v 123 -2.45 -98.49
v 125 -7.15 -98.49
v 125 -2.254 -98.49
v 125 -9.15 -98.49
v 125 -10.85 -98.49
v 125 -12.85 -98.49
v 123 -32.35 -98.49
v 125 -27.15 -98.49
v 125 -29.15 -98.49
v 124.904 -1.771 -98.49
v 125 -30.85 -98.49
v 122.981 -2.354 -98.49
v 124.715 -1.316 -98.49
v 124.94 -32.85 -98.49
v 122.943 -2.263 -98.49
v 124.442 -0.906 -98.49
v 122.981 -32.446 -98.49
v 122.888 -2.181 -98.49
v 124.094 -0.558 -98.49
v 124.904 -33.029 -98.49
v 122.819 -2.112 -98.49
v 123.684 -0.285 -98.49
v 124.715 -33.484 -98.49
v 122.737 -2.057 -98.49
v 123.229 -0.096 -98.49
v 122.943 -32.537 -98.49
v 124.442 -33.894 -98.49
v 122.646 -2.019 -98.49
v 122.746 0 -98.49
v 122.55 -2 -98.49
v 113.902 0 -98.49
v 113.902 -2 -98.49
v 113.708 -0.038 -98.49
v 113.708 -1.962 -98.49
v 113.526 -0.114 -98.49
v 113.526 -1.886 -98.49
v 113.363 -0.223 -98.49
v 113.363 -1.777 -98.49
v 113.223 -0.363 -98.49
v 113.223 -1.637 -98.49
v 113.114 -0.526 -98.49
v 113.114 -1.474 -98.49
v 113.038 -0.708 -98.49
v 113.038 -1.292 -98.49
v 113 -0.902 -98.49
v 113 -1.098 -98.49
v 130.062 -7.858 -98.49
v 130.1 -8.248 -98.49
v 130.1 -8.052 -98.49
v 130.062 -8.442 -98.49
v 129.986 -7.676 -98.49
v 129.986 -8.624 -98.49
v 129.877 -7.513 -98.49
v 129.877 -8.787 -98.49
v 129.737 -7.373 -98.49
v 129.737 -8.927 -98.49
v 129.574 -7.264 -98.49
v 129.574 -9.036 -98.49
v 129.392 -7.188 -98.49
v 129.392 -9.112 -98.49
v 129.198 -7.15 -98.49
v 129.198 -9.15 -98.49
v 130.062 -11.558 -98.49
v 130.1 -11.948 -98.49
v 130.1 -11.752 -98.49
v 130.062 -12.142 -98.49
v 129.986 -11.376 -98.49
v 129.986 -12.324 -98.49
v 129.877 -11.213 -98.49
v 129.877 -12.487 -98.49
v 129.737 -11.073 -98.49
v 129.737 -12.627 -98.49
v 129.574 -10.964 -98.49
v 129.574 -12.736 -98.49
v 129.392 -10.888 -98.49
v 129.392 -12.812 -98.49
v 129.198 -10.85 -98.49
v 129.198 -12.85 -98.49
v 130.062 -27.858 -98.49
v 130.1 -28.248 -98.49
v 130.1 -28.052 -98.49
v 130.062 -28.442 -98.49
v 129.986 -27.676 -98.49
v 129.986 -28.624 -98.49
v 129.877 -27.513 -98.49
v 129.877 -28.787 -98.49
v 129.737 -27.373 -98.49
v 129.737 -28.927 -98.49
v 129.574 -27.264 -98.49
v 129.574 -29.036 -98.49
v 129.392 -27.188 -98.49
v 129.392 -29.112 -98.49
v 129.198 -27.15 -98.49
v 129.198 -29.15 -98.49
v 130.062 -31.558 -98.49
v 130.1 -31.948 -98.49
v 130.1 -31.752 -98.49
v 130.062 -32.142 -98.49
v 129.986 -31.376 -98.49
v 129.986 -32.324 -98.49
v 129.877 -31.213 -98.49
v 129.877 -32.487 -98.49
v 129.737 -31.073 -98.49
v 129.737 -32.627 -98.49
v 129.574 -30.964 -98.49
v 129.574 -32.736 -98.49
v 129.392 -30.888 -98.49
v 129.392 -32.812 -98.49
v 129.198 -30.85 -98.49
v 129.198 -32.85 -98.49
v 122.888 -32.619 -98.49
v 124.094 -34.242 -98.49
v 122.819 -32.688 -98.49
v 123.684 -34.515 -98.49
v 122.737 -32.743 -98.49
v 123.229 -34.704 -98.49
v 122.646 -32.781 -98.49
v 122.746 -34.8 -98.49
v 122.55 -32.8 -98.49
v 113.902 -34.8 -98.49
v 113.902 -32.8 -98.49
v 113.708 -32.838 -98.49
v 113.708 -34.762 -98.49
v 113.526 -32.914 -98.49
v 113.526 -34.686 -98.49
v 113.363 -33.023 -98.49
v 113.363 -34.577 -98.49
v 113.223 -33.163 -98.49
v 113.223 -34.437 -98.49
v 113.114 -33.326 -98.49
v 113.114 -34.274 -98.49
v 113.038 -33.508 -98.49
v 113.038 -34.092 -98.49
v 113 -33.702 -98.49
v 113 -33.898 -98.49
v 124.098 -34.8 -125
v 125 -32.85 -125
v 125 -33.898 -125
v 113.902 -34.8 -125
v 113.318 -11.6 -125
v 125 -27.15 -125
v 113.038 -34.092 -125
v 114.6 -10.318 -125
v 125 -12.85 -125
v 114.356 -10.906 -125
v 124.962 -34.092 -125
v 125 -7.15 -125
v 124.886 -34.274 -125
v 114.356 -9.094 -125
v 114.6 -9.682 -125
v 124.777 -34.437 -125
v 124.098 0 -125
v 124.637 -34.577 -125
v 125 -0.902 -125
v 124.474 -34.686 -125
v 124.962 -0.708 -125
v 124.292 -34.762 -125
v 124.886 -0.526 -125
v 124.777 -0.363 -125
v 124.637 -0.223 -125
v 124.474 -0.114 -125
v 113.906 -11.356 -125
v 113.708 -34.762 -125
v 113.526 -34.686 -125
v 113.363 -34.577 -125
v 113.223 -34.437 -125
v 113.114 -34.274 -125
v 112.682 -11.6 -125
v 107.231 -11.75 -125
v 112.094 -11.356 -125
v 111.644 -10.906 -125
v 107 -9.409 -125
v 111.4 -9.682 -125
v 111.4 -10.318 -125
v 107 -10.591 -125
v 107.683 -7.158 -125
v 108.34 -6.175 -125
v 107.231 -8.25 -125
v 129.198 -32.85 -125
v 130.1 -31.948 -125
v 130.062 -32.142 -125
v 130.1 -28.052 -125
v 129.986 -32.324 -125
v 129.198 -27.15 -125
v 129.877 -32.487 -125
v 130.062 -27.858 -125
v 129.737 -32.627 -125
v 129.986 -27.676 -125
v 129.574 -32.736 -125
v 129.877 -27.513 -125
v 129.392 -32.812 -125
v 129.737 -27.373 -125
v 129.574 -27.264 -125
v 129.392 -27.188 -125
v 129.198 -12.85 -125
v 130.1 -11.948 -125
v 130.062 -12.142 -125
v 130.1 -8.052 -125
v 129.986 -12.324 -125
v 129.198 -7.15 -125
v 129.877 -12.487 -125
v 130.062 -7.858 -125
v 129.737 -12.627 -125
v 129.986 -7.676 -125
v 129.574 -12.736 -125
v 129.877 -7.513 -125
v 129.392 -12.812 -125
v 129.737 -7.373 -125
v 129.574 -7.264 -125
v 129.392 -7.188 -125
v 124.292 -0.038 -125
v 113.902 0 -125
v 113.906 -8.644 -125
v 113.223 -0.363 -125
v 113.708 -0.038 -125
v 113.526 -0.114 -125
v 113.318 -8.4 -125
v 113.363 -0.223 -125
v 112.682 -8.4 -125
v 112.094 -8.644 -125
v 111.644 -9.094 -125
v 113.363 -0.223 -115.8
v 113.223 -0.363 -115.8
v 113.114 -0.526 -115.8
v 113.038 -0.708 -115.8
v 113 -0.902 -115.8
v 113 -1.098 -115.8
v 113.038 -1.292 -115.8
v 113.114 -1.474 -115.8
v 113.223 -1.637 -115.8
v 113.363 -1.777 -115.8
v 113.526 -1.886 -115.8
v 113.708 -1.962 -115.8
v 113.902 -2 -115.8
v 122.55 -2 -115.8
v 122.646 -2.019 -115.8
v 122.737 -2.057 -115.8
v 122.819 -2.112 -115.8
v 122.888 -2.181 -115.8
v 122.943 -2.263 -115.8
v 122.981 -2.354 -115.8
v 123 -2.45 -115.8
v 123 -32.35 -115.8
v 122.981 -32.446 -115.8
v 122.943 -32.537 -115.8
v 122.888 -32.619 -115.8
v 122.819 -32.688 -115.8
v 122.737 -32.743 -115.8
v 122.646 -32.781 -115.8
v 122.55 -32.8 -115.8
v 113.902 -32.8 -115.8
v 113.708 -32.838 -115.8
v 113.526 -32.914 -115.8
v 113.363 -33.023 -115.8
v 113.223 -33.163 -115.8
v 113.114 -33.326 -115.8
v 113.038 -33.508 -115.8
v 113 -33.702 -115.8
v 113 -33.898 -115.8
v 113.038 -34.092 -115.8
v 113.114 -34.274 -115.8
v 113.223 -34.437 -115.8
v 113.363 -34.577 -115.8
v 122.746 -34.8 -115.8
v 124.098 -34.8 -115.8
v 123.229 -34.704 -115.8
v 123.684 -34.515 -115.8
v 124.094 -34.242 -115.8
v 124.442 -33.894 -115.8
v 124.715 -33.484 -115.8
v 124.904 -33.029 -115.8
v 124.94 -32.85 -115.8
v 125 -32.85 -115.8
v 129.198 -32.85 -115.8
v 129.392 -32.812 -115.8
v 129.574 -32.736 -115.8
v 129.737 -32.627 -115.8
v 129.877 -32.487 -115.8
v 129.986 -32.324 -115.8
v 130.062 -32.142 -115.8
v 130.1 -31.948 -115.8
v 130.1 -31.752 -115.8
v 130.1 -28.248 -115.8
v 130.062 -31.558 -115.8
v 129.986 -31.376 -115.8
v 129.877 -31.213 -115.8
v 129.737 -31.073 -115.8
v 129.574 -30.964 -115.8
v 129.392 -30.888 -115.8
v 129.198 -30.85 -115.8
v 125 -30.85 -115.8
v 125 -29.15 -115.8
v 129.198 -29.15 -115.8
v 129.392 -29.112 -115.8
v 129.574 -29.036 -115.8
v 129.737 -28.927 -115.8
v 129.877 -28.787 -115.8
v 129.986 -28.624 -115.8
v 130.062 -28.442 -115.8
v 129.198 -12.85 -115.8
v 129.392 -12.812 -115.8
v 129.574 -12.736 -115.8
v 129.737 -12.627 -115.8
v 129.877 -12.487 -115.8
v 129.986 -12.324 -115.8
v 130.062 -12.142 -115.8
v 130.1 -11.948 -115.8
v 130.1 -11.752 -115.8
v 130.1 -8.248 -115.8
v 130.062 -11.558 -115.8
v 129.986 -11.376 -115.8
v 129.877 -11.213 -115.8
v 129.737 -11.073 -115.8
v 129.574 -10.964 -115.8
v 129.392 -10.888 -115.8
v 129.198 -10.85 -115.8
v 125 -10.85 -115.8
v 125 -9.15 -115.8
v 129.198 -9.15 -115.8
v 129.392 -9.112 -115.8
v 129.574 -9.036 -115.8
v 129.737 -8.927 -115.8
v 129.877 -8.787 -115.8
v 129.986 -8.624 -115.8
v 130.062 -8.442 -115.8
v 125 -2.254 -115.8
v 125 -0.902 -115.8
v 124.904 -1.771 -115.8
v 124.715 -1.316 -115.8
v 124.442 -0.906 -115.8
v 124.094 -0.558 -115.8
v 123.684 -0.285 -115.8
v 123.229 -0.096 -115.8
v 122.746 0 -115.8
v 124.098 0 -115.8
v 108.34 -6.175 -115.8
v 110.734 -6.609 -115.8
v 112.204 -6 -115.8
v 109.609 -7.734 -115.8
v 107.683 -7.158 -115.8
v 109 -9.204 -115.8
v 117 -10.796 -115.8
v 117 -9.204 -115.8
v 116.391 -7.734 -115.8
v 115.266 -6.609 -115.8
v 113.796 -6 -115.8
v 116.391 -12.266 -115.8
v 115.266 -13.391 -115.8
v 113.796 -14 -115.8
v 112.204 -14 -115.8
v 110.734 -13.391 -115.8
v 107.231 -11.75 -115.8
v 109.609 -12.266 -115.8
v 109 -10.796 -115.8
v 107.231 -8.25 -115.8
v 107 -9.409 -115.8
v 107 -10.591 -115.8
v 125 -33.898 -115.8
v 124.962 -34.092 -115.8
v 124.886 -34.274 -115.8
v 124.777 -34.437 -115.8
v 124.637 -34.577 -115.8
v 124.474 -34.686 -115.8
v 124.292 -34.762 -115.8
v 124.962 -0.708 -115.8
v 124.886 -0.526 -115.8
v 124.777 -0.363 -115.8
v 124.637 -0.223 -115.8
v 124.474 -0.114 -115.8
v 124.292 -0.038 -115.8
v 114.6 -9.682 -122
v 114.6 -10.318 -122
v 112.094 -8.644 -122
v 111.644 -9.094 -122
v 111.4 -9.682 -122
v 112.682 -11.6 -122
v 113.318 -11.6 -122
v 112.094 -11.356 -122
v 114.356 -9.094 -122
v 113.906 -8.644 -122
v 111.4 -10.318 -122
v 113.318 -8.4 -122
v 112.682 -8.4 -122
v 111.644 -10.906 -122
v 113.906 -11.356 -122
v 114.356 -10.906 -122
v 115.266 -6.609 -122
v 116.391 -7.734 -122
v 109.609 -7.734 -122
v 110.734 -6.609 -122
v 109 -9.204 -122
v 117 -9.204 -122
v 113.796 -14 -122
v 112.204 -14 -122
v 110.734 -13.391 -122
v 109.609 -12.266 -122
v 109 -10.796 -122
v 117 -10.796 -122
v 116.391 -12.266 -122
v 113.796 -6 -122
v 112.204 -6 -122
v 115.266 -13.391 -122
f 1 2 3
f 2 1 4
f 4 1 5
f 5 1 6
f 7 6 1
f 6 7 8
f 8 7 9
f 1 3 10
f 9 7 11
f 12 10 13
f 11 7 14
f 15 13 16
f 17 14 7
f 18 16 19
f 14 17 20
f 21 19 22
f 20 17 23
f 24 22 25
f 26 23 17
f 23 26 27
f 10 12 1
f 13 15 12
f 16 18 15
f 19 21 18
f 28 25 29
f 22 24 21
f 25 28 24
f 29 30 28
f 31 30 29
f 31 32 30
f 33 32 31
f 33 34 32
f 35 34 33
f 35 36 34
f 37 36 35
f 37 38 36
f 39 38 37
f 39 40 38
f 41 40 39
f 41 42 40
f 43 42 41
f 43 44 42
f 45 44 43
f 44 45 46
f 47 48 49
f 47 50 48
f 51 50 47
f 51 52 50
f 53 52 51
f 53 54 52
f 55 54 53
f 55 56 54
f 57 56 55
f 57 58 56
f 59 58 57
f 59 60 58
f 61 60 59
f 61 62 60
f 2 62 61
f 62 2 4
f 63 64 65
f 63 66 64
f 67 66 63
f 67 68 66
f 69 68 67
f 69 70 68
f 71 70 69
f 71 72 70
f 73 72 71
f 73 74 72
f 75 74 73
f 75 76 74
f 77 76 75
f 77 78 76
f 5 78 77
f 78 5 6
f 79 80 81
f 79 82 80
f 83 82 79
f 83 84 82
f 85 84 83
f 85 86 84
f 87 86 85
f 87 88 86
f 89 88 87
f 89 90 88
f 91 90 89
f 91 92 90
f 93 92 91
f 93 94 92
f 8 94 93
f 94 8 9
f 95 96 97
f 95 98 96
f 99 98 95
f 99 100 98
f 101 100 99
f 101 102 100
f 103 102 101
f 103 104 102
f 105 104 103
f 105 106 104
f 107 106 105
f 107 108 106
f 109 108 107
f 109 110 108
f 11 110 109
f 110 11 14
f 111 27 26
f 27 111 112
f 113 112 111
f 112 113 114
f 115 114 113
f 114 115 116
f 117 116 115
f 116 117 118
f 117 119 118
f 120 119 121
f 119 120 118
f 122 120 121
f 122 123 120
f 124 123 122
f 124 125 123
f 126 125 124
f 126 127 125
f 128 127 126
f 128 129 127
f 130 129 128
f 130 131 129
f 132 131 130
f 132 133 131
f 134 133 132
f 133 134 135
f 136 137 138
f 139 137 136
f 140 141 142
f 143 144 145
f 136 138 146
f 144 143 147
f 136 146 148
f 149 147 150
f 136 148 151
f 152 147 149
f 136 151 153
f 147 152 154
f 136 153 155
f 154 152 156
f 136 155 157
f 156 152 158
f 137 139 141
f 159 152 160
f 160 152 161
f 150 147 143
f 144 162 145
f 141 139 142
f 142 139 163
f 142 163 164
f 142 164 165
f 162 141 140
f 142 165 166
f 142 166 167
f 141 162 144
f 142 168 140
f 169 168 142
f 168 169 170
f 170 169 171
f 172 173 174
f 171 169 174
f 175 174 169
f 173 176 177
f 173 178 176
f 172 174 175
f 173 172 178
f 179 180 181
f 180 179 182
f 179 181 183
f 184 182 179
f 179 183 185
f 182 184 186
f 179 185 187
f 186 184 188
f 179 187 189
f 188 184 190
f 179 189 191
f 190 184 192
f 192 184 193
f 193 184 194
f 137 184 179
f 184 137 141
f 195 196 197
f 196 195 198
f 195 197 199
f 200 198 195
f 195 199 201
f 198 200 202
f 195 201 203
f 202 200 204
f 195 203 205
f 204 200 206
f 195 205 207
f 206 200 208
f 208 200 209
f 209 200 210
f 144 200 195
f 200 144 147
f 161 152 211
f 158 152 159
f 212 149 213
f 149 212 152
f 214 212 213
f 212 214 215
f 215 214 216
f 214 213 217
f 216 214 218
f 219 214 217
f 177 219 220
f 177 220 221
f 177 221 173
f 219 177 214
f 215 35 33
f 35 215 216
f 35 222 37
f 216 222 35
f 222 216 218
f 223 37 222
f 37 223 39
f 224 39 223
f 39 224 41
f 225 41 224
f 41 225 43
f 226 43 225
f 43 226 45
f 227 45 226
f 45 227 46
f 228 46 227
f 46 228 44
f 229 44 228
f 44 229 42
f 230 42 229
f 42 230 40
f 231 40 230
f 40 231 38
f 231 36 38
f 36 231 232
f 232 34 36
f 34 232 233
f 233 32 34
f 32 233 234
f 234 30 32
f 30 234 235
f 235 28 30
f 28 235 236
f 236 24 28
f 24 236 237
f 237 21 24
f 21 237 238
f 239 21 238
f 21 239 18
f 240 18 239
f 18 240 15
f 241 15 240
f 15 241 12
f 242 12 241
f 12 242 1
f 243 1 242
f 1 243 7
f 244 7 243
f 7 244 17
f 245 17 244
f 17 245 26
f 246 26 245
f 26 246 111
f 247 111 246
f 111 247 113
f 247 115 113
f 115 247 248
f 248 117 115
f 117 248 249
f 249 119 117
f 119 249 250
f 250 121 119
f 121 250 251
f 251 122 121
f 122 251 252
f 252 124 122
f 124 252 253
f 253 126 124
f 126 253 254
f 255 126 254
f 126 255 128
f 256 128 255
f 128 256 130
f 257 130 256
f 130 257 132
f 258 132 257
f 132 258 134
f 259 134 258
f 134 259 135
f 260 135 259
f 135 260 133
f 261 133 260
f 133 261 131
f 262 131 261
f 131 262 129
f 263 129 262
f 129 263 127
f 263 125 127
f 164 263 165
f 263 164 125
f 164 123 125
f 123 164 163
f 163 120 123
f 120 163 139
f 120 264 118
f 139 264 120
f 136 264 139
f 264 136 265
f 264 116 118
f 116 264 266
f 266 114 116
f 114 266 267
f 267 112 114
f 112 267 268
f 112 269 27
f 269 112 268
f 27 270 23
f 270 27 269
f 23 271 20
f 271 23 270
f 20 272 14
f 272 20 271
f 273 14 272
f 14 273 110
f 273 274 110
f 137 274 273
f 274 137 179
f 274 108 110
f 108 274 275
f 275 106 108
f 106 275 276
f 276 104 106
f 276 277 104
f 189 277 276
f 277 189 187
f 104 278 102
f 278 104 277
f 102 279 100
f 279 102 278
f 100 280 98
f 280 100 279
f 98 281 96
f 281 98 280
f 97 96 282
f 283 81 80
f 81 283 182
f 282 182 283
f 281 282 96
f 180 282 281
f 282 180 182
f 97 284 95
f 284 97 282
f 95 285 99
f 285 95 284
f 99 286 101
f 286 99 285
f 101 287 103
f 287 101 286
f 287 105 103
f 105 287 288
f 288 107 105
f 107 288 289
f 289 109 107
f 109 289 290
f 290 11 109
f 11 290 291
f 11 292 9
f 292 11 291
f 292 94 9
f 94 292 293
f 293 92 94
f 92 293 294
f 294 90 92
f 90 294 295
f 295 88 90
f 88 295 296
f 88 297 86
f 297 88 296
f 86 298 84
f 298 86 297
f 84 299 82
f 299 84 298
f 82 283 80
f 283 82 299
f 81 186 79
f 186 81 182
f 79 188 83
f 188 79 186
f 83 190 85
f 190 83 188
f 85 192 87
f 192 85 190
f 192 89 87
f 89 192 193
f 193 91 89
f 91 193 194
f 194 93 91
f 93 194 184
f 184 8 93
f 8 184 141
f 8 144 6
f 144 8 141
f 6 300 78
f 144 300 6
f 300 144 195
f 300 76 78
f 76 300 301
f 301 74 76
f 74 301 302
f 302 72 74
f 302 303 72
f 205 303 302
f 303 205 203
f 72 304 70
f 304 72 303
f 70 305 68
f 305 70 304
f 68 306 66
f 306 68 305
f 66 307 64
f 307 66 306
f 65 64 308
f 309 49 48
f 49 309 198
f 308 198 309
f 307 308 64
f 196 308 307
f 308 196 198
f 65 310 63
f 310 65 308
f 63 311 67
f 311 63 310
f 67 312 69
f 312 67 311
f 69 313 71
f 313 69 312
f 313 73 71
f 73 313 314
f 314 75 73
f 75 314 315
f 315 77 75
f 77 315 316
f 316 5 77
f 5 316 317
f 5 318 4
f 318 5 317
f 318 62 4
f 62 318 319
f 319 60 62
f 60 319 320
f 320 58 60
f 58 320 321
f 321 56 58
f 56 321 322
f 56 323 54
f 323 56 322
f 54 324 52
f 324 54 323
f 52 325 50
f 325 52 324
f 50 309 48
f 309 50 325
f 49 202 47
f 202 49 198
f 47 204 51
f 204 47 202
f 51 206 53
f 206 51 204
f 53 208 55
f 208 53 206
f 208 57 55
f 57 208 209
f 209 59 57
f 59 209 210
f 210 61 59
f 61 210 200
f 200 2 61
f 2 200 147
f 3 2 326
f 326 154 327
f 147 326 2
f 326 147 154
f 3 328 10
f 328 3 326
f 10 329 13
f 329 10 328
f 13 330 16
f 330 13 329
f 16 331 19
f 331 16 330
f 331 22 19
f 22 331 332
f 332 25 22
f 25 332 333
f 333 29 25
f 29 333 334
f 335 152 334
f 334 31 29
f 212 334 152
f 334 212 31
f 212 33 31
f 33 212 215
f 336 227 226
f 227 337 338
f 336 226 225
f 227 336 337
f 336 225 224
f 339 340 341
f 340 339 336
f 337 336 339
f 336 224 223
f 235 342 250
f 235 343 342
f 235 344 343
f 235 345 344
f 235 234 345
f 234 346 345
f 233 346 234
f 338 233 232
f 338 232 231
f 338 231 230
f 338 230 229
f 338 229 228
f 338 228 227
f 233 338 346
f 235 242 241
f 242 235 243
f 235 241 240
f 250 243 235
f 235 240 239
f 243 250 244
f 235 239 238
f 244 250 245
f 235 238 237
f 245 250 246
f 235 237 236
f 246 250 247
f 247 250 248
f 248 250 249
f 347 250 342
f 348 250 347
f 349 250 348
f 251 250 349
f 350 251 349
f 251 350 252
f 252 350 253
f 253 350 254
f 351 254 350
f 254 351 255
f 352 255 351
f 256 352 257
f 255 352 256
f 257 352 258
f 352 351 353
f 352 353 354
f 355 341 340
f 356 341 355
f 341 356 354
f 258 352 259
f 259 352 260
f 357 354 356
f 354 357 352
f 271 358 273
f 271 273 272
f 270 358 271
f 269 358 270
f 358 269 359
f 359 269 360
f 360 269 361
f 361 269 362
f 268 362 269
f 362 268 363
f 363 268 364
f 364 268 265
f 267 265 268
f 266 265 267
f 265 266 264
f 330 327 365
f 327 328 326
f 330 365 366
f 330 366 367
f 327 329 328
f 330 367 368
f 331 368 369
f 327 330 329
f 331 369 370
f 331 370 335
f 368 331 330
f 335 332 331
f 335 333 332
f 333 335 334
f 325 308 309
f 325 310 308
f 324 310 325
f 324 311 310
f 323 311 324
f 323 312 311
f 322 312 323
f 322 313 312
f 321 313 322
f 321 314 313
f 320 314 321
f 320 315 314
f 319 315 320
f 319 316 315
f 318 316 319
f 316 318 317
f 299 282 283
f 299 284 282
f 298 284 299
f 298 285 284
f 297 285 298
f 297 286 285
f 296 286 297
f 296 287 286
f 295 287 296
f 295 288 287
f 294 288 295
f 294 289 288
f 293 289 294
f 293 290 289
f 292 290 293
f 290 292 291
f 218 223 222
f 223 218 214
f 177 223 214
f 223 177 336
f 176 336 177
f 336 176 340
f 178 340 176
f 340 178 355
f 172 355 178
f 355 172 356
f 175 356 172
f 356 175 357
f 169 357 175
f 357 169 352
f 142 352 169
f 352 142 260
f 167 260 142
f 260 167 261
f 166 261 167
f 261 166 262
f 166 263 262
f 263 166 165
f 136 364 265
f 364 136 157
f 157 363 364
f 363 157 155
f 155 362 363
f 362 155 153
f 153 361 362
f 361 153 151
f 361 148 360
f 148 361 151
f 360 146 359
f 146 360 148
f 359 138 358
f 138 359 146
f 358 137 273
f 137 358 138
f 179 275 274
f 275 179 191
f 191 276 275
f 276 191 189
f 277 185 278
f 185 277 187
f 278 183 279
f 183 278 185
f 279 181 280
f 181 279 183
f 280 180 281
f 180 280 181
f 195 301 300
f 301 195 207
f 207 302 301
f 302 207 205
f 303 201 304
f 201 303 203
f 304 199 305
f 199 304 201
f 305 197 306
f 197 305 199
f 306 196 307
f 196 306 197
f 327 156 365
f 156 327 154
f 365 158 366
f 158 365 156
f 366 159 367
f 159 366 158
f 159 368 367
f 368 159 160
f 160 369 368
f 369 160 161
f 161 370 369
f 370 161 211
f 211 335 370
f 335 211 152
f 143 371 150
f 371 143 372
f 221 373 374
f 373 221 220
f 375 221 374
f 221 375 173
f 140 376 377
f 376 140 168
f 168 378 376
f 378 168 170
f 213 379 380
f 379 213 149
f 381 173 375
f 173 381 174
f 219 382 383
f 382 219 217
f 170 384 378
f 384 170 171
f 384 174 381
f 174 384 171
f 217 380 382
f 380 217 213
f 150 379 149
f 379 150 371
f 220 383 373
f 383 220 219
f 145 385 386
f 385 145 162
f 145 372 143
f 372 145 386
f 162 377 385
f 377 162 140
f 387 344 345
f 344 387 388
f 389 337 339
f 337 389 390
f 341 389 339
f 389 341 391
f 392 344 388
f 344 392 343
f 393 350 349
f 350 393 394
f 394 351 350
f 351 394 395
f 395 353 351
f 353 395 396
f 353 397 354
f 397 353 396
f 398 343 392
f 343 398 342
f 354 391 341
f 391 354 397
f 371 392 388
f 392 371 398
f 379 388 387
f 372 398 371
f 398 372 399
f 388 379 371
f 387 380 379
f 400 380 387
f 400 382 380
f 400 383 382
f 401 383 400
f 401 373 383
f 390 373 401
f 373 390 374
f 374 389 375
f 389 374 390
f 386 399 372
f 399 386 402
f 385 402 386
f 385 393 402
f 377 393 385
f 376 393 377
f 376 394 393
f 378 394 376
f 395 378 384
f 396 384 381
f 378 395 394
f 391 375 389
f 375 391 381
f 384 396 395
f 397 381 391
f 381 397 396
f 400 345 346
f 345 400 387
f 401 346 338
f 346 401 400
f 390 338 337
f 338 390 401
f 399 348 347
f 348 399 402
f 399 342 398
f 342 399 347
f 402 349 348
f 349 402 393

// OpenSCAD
// file: ../frame-mockup.scad
include <lumpyscad/lib.scad>;

tolerance = 0.2;

y_rail_side_rail_dist_x = 135;
y_rail_side_rail_dist_z = 33;
y_rail_length = 330;
y_rail_length_front = 190;
side_rail_length = 290;
side_rail_length_front = 125;
side_rail_length_rear = side_rail_length-40-side_rail_length_front;
side_connector_length = 250;
x_rail_length = side_connector_length+40;

x_rail_pos_z = 200;

vertical_side_rail_length = 400;

psu_length = 215+tolerance*2;
psu_width = 115+tolerance*2;
psu_height = 30+tolerance*2;

psu_terminal_area_depth = 15;
psu_metal_thickness = 2;

module position_x_axis() {
  translate([0,front*20/2,x_rail_pos_z]) {
    children();
  }
}

// meanwell LRS-350-24
module psu() {
  psu_fan_from_end = 48; // not very accurate, only for visualization
  psu_fan_from_side = 38; // not very accurate, only for visualization
  psu_fan_diam = 52; // not very accurate, only for visualization

  module body() {
    cube([psu_width,psu_length,psu_height],center=true);
  }

  module holes() {
    for(x=[left,right],y=[32.5,150]) {
      translate([0,-psu_length/2+y,-psu_height/2]) {
        // side holes
        translate([x*psu_width/2,0,12.5]) {
          rotate([0,90,0]) {
            hole(4,10,resolution);
          }
        }
        translate([x*(50/2),0,0]) {
          hole(4,10,resolution);
        }
      }
    }

    translate([left*(psu_width/2-psu_fan_from_side),psu_length/2-psu_fan_from_end,psu_height/2]) {
      hole(psu_fan_diam,0.5,resolution);
    }

    translate([0,front*(psu_length/2),psu_height/2]) {
      height = psu_height-psu_metal_thickness;
      width = psu_width-psu_metal_thickness*2;

      cube([width,psu_terminal_area_depth*2,height*2],center=true);
    }
  }

  difference() {
    color("#bbb") body();
    color("#777") holes();
  }
}

module fake_ender3_frame(frame_color="#555", opacity=1) {
  module body() {
    // side braces/feet
    for(x=[left,right]) {
      translate([x*(side_connector_length/2+40/2),side_rail_length/2-side_rail_length_front,40/2]) {
        rotate([90,0,0]) {
          rotate([0,0,90]) {
            color(frame_color, opacity) extrusion_4040(side_rail_length);
          }
        }
      }
    }

    // vertical
    for(x=[left,right]) {
      translate([x*(side_connector_length/2+40/2),40/2,40]) {
        translate([0,0,vertical_side_rail_length/2]) {
          color(frame_color, opacity) extrusion_2040(vertical_side_rail_length);
        }
        nema_type = NEMA17_34;
        translate([0,20/2+NEMA_width(nema_type)/2,NEMA_length(nema_type)]) {
          rotate([0,0,90*x]) {
            NEMA(nema_type);
          }
        }
      }
    }

    // top rail
    translate([0,40/2,40+vertical_side_rail_length+20/2]) {
      rotate([0,90,0]) {
        color(frame_color, opacity) extrusion_2020(side_connector_length+40*2);
      }
    }

    position_x_axis() {
      // x rail
      rotate([0,90,0]) {
        color(frame_color, opacity) extrusion_2020(y_rail_length);
      }
    }

    // left/right connector
    color(frame_color, opacity) difference() {
      translate([0,40/2,40/2]) {
        rotate([0,90,0]) {
          extrusion_4040(side_connector_length);
        }
      }
      translate([0,20,40/2+y_rail_side_rail_dist_z]) {
        cube([20,50,40],center=true);
      }
      translate([-side_connector_length/2+58,10,0]) {
        hole(3,40,resolution);
      }
    }

    // y rail
    translate([0,y_rail_length/2-y_rail_length_front,40/2+y_rail_side_rail_dist_z]) {
      rotate([90,0,0]) {
        rotate([0,0,90]) {
          color(frame_color, opacity) extrusion_2040(y_rail_length);
        }
      }
    }
  }

  module holes() {
    wiring_cut_from_x_min = 15;
    wiring_cut_width = 40;
    wiring_cut_height = 20;
    translate([-side_connector_length/2+wiring_cut_from_x_min+wiring_cut_width/2,0,0]) {
      cube([wiring_cut_width,100,wiring_cut_height*2],center=true);
    }

  }

  difference() {
    body();
    color("lightgrey") holes();
  }
}
// main file
include <../psu-mount.scad>;

rotate([90,0,0]) {
  mirror([psu_mirror_x,0,0]) {
    psu_mount_corner_support();
  }
}
